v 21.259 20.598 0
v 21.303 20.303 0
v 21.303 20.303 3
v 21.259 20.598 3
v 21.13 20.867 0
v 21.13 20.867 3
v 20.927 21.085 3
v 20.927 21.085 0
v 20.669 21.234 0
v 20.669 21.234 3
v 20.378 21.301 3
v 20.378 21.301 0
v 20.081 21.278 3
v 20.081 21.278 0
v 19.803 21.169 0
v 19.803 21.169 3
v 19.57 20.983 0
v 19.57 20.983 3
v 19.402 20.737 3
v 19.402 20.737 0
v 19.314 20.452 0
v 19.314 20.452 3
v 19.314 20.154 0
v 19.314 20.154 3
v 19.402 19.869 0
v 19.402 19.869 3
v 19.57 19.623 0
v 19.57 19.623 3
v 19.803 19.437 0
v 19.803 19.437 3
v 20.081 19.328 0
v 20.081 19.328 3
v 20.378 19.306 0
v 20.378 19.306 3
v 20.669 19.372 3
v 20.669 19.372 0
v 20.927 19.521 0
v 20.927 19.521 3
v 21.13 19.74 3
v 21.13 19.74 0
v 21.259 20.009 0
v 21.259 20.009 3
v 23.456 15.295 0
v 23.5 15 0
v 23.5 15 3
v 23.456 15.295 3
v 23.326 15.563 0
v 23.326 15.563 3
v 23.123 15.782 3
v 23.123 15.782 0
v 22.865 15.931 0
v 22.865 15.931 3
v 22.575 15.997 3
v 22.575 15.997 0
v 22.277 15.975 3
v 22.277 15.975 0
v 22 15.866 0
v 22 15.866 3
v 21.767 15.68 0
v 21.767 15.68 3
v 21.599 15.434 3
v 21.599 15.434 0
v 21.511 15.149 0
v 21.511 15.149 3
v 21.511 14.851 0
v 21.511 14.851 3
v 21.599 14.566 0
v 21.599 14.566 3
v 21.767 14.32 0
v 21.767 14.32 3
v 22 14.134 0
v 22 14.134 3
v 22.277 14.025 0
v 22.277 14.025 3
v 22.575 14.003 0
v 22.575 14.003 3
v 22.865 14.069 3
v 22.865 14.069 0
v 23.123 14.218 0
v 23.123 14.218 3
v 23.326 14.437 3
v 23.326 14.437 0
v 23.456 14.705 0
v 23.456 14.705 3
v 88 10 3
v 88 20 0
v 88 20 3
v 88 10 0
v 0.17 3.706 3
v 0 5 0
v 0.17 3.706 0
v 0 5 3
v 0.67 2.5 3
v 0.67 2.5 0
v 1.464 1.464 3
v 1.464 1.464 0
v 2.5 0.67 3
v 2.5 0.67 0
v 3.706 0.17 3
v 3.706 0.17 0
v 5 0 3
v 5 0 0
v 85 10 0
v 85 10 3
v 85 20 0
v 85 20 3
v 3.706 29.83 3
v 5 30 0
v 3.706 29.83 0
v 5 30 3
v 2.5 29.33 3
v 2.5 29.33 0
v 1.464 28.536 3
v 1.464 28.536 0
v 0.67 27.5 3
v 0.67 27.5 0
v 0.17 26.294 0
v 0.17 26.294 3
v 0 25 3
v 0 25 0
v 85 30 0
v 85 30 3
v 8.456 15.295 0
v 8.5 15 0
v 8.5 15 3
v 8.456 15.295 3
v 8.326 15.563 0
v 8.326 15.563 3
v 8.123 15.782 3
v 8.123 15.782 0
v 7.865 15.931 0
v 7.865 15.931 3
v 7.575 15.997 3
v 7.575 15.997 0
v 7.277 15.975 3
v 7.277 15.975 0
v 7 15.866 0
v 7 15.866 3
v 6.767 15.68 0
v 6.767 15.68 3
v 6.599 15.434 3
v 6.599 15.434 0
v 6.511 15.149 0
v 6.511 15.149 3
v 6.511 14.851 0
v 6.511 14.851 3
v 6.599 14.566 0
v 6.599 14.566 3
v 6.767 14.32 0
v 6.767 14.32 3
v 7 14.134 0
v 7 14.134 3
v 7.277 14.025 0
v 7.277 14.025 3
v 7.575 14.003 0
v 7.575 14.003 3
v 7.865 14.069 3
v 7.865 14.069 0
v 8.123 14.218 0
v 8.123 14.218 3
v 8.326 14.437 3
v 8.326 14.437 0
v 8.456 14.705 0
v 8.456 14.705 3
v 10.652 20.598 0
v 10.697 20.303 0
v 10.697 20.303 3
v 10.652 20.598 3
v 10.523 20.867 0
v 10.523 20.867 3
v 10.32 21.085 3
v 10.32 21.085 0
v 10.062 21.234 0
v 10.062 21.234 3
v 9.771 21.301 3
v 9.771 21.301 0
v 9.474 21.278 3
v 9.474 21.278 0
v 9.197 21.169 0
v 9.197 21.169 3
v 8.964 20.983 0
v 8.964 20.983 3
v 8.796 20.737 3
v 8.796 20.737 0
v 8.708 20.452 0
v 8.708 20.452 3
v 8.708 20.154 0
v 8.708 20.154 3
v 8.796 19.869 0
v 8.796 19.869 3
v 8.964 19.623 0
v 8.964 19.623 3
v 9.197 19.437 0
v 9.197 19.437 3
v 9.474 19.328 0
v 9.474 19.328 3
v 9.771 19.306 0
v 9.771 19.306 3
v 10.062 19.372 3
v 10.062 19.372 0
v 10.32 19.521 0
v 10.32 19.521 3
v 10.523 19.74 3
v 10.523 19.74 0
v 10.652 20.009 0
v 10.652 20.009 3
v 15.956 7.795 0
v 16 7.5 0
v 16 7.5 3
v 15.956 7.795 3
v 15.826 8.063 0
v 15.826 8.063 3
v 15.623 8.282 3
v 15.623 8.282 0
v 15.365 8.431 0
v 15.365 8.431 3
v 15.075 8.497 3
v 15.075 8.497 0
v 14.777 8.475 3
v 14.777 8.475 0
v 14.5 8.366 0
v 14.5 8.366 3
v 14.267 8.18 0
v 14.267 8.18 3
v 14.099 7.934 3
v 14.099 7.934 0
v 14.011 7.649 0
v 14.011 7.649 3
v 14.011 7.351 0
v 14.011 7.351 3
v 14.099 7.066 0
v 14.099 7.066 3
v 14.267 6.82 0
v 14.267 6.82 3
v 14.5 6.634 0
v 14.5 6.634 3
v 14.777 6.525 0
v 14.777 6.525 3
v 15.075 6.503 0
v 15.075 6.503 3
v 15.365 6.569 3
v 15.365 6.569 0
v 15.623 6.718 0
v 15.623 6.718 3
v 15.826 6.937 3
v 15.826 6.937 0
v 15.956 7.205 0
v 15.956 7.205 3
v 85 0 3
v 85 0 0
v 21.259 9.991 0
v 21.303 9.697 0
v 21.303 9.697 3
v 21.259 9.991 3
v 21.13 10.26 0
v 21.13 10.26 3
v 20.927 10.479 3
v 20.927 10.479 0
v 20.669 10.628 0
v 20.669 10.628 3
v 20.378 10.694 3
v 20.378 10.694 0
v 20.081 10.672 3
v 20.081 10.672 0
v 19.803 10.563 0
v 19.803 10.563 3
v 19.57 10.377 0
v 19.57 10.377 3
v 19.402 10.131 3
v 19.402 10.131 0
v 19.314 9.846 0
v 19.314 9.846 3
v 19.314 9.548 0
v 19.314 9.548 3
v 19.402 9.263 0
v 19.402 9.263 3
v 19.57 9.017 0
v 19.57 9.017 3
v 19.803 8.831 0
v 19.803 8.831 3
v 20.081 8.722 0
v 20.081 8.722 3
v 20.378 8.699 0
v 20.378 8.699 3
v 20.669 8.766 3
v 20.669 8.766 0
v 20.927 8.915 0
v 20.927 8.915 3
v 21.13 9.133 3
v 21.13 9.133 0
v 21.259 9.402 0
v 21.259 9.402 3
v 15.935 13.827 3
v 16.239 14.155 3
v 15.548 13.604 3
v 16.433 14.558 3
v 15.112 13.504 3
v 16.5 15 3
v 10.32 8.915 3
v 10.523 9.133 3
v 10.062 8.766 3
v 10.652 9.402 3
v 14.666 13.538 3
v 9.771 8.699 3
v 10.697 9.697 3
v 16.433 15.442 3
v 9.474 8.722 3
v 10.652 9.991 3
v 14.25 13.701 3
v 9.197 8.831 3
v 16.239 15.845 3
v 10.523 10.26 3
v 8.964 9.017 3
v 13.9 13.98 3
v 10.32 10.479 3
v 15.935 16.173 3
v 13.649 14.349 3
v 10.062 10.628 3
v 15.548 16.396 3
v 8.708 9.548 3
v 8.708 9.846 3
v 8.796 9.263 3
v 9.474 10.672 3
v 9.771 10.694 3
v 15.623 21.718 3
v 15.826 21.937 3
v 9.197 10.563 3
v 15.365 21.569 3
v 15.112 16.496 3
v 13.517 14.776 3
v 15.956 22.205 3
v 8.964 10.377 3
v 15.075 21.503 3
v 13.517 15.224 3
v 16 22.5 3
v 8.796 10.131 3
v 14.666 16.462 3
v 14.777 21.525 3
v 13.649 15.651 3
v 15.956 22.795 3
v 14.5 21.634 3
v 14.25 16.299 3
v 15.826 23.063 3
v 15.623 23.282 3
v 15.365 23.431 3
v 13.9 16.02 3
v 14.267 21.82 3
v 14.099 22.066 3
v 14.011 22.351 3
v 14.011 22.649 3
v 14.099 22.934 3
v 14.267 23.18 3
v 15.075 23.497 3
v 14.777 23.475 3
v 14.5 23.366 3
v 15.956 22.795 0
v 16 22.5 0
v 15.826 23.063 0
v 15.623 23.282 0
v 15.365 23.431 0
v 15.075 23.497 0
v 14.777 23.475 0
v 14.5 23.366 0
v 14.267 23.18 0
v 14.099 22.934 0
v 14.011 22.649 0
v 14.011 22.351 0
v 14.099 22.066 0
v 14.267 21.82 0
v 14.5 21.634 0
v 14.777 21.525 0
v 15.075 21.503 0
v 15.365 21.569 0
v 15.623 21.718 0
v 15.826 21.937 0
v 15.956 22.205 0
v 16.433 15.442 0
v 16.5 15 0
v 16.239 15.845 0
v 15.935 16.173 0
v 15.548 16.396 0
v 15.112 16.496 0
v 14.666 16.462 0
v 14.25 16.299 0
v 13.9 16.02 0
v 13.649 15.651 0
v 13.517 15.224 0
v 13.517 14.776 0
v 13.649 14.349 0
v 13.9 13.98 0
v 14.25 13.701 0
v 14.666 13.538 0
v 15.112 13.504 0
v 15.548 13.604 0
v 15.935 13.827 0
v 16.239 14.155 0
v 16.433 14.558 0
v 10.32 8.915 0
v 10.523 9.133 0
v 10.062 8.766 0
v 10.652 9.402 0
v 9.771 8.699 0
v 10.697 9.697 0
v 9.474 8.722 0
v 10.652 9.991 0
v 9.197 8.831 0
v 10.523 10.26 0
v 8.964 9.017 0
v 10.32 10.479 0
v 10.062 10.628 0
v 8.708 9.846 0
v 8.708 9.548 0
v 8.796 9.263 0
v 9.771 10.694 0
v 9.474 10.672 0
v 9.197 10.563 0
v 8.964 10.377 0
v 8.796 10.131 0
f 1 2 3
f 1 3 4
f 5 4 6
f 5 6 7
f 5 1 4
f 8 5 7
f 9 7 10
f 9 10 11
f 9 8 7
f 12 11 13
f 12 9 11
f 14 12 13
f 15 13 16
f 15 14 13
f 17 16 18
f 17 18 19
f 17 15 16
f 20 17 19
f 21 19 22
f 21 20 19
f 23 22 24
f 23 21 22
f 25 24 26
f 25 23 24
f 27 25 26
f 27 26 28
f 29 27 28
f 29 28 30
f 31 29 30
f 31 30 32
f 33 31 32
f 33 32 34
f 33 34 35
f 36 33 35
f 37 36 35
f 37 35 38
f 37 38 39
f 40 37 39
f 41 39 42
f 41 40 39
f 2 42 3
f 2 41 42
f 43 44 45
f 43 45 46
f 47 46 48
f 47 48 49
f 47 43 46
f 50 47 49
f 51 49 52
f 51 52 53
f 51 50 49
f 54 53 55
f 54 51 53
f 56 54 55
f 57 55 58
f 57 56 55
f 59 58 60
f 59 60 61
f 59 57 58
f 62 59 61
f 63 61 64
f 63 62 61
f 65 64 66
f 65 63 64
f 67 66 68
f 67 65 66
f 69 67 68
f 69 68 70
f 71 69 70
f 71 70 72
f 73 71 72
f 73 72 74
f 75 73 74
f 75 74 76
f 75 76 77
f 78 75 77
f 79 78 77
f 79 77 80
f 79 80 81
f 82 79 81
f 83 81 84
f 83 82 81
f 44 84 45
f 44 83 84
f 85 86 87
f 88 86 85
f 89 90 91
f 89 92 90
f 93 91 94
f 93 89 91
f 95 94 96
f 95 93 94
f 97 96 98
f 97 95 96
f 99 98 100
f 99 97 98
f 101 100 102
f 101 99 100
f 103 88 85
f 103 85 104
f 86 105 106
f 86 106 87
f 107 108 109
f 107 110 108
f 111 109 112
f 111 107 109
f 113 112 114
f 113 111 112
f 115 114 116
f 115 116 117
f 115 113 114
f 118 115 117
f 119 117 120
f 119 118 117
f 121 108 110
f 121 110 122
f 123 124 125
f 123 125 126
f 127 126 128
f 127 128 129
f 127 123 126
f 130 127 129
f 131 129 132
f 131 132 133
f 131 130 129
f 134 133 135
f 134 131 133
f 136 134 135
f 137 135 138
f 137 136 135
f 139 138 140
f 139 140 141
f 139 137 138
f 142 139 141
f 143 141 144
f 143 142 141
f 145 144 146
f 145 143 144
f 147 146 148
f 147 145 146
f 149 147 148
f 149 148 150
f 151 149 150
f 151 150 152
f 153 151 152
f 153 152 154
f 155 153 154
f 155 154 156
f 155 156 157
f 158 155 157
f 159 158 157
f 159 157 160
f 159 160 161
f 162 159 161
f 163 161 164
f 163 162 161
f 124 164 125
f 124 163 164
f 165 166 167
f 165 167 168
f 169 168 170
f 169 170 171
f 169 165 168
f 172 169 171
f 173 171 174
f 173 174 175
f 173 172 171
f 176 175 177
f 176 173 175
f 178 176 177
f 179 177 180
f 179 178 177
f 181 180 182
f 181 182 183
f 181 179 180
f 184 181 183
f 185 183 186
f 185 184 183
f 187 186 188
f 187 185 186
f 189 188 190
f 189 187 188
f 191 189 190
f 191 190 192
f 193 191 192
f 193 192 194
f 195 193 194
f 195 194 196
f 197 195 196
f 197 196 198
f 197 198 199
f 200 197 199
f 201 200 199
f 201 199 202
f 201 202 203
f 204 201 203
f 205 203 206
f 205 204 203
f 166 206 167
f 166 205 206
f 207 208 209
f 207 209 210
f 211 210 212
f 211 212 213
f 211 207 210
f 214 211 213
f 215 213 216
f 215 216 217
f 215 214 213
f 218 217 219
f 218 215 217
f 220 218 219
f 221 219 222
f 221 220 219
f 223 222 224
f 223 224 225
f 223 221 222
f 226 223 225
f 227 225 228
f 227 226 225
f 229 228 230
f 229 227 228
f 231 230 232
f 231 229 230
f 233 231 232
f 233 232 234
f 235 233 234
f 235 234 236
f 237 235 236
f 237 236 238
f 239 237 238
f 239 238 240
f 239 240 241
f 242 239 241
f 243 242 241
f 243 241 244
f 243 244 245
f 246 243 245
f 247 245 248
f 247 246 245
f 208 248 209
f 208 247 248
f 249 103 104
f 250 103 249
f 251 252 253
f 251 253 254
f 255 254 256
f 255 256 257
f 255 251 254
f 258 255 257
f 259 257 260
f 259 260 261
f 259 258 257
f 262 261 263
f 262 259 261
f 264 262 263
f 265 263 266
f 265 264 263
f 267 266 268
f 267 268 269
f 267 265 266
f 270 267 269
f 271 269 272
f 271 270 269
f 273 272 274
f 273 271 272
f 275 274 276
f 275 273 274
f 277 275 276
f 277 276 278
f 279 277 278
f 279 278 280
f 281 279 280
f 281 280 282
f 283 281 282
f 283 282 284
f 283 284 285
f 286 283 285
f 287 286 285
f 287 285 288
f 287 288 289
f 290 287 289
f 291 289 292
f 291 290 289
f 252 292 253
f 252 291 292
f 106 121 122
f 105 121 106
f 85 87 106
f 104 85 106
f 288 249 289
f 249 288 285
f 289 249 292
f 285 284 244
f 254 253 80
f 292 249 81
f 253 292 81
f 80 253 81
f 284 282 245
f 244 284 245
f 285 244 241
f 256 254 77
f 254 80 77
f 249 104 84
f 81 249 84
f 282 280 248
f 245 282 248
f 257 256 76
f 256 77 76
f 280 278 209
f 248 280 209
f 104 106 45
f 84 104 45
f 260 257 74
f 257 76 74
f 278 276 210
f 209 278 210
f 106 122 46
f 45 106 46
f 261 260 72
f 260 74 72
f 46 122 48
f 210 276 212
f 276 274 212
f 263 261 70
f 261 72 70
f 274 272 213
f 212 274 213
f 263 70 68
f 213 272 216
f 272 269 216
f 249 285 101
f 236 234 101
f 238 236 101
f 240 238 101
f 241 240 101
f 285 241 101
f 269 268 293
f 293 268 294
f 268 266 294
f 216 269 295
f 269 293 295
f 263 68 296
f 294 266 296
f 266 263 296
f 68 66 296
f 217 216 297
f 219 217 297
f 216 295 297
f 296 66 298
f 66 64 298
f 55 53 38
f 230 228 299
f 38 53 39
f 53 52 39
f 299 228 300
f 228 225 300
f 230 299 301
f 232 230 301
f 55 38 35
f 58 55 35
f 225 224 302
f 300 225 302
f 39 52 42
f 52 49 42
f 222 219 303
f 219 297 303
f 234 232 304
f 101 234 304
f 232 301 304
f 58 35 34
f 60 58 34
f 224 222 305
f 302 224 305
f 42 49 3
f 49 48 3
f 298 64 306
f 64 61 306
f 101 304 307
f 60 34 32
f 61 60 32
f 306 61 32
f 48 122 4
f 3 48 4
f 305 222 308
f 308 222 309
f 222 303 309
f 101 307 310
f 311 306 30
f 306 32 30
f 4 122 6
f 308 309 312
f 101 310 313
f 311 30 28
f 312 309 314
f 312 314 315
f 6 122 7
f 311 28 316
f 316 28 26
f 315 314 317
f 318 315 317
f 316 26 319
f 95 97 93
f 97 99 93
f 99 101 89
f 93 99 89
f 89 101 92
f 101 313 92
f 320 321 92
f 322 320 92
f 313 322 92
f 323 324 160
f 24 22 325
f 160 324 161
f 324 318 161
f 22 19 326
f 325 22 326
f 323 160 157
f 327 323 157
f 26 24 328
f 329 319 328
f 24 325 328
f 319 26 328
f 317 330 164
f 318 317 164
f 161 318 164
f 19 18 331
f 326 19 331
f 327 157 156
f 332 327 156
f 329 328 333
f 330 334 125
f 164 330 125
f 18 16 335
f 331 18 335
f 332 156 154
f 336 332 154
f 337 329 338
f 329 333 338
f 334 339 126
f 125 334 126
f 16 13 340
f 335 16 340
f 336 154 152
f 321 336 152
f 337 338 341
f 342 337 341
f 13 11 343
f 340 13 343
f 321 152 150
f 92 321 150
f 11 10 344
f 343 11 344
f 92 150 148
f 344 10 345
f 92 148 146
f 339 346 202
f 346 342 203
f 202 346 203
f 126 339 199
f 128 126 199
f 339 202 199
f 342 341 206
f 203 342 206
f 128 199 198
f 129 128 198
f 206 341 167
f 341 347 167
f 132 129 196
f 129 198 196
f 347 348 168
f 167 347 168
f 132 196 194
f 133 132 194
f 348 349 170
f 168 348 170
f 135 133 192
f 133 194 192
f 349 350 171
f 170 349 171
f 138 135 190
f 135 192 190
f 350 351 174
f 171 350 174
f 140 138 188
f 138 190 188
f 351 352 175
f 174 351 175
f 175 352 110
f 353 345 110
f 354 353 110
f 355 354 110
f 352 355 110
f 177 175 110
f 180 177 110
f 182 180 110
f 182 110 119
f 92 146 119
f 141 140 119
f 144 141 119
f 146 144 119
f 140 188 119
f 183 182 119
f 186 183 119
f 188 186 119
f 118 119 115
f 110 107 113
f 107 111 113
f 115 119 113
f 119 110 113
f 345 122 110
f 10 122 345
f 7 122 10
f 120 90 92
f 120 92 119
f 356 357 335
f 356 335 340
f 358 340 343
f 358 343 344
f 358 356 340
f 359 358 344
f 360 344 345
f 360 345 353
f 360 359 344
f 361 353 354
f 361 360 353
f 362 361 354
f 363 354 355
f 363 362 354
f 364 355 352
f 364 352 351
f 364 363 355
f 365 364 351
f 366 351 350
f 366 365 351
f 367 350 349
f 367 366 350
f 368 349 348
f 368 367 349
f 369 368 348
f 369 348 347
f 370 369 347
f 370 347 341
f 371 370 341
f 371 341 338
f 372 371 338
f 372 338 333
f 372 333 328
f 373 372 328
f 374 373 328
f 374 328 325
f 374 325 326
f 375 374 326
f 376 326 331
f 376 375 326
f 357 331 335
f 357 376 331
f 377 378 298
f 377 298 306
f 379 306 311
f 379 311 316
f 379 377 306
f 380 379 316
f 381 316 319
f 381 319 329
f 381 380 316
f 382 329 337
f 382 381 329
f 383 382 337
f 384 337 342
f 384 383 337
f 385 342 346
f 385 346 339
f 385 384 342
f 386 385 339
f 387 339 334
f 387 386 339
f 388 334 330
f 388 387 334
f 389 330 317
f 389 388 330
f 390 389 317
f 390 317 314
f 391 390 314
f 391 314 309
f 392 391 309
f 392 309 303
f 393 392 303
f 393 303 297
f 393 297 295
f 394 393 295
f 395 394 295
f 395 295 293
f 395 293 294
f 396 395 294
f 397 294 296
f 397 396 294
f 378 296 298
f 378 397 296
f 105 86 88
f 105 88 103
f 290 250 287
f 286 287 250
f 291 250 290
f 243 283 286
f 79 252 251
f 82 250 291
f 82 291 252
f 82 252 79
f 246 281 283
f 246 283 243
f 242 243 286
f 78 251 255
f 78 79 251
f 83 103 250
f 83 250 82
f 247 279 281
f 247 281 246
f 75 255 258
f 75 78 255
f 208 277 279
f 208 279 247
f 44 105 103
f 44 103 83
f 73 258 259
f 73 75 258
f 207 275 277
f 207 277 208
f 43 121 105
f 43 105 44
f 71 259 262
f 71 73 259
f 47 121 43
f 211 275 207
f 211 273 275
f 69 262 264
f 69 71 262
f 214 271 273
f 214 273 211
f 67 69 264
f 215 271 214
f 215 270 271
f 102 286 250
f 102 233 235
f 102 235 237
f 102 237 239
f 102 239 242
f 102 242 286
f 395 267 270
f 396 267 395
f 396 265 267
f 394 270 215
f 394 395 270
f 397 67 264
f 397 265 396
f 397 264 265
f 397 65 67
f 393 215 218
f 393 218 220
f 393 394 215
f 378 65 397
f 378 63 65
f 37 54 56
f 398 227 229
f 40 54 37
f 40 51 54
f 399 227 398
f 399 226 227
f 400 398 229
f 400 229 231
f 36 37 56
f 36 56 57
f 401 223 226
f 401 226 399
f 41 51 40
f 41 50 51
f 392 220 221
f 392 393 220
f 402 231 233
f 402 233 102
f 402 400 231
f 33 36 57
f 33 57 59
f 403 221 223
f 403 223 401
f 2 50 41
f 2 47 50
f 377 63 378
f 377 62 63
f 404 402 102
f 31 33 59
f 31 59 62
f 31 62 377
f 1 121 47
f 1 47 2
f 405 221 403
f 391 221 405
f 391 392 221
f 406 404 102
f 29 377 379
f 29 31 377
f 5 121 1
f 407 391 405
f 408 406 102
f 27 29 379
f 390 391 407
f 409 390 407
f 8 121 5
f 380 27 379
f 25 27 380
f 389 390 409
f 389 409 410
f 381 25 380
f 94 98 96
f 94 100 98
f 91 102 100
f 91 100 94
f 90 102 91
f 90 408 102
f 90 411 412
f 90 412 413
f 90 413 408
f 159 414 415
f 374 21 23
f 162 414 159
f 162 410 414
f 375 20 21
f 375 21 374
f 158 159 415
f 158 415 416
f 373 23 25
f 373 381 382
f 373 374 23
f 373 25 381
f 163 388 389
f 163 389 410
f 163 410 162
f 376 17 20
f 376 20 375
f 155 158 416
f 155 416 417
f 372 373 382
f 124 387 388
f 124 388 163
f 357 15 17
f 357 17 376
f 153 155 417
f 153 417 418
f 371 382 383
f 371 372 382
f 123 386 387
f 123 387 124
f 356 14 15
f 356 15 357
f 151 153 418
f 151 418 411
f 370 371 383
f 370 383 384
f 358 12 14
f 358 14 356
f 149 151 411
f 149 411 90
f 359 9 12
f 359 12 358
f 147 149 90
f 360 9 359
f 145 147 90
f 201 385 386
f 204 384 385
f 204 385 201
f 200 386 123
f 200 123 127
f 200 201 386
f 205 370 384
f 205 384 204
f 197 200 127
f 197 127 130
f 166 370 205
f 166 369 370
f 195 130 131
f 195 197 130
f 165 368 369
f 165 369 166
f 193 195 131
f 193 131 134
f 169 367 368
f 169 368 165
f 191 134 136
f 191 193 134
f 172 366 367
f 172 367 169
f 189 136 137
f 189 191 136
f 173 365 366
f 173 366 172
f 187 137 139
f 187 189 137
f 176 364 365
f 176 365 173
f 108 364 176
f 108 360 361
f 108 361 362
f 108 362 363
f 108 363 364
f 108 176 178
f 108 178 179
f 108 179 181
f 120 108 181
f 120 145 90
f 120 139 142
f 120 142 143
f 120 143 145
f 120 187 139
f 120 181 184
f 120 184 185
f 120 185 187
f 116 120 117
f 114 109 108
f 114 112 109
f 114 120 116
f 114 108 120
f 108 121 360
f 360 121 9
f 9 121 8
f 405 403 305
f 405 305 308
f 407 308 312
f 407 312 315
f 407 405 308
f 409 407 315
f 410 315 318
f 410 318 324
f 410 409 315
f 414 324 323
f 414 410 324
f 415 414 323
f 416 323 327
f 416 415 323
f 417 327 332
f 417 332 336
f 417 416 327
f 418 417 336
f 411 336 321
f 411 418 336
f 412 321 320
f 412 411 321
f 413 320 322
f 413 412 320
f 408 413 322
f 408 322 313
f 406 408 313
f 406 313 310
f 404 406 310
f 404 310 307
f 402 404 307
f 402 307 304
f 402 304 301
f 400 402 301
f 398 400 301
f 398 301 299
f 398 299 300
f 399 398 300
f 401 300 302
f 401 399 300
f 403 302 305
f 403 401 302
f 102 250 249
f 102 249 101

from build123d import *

# Parameters (mm, degrees)
SKETCH1_R           = 1.5
SKETCH1_R_2         = 1
BOSS_EXTRUDE1_DEPTH = 3
FILLET1_R           = 5


with BuildPart() as part:
    # Sketch1 → Boss-Extrude1 (new body)
    with BuildSketch(Plane.XY):
        Polygon((85, 30), (85, 20), (88, 20), (88, 10), (85, 10), (85, 0), (0, 0), (0, 30), align=None)
        with Locations((15, 15)):
            Circle(SKETCH1_R, mode=Mode.SUBTRACT)
        with Locations((7.5, 15)):
            Circle(SKETCH1_R_2, mode=Mode.SUBTRACT)
        with Locations((9.696699141, 20.303300859)):
            Circle(SKETCH1_R_2, mode=Mode.SUBTRACT)
        with Locations((15, 22.5)):
            Circle(SKETCH1_R_2, mode=Mode.SUBTRACT)
        with Locations((20.303300859, 20.303300859)):
            Circle(SKETCH1_R_2, mode=Mode.SUBTRACT)
        with Locations((22.5, 15)):
            Circle(SKETCH1_R_2, mode=Mode.SUBTRACT)
        with Locations((20.303300859, 9.696699141)):
            Circle(SKETCH1_R_2, mode=Mode.SUBTRACT)
        with Locations((15, 7.5)):
            Circle(SKETCH1_R_2, mode=Mode.SUBTRACT)
        with Locations((9.696699141, 9.696699141)):
            Circle(SKETCH1_R_2, mode=Mode.SUBTRACT)
    extrude(amount=BOSS_EXTRUDE1_DEPTH)

    # Fillet1
    fillet1_edges = [part.edges().sort_by_distance(p)[0] for p in [
        (0, 0, 1.5),
        (0, 30, 1.5),
    ]]
    fillet(fillet1_edges, radius=FILLET1_R)


solid = part.part
